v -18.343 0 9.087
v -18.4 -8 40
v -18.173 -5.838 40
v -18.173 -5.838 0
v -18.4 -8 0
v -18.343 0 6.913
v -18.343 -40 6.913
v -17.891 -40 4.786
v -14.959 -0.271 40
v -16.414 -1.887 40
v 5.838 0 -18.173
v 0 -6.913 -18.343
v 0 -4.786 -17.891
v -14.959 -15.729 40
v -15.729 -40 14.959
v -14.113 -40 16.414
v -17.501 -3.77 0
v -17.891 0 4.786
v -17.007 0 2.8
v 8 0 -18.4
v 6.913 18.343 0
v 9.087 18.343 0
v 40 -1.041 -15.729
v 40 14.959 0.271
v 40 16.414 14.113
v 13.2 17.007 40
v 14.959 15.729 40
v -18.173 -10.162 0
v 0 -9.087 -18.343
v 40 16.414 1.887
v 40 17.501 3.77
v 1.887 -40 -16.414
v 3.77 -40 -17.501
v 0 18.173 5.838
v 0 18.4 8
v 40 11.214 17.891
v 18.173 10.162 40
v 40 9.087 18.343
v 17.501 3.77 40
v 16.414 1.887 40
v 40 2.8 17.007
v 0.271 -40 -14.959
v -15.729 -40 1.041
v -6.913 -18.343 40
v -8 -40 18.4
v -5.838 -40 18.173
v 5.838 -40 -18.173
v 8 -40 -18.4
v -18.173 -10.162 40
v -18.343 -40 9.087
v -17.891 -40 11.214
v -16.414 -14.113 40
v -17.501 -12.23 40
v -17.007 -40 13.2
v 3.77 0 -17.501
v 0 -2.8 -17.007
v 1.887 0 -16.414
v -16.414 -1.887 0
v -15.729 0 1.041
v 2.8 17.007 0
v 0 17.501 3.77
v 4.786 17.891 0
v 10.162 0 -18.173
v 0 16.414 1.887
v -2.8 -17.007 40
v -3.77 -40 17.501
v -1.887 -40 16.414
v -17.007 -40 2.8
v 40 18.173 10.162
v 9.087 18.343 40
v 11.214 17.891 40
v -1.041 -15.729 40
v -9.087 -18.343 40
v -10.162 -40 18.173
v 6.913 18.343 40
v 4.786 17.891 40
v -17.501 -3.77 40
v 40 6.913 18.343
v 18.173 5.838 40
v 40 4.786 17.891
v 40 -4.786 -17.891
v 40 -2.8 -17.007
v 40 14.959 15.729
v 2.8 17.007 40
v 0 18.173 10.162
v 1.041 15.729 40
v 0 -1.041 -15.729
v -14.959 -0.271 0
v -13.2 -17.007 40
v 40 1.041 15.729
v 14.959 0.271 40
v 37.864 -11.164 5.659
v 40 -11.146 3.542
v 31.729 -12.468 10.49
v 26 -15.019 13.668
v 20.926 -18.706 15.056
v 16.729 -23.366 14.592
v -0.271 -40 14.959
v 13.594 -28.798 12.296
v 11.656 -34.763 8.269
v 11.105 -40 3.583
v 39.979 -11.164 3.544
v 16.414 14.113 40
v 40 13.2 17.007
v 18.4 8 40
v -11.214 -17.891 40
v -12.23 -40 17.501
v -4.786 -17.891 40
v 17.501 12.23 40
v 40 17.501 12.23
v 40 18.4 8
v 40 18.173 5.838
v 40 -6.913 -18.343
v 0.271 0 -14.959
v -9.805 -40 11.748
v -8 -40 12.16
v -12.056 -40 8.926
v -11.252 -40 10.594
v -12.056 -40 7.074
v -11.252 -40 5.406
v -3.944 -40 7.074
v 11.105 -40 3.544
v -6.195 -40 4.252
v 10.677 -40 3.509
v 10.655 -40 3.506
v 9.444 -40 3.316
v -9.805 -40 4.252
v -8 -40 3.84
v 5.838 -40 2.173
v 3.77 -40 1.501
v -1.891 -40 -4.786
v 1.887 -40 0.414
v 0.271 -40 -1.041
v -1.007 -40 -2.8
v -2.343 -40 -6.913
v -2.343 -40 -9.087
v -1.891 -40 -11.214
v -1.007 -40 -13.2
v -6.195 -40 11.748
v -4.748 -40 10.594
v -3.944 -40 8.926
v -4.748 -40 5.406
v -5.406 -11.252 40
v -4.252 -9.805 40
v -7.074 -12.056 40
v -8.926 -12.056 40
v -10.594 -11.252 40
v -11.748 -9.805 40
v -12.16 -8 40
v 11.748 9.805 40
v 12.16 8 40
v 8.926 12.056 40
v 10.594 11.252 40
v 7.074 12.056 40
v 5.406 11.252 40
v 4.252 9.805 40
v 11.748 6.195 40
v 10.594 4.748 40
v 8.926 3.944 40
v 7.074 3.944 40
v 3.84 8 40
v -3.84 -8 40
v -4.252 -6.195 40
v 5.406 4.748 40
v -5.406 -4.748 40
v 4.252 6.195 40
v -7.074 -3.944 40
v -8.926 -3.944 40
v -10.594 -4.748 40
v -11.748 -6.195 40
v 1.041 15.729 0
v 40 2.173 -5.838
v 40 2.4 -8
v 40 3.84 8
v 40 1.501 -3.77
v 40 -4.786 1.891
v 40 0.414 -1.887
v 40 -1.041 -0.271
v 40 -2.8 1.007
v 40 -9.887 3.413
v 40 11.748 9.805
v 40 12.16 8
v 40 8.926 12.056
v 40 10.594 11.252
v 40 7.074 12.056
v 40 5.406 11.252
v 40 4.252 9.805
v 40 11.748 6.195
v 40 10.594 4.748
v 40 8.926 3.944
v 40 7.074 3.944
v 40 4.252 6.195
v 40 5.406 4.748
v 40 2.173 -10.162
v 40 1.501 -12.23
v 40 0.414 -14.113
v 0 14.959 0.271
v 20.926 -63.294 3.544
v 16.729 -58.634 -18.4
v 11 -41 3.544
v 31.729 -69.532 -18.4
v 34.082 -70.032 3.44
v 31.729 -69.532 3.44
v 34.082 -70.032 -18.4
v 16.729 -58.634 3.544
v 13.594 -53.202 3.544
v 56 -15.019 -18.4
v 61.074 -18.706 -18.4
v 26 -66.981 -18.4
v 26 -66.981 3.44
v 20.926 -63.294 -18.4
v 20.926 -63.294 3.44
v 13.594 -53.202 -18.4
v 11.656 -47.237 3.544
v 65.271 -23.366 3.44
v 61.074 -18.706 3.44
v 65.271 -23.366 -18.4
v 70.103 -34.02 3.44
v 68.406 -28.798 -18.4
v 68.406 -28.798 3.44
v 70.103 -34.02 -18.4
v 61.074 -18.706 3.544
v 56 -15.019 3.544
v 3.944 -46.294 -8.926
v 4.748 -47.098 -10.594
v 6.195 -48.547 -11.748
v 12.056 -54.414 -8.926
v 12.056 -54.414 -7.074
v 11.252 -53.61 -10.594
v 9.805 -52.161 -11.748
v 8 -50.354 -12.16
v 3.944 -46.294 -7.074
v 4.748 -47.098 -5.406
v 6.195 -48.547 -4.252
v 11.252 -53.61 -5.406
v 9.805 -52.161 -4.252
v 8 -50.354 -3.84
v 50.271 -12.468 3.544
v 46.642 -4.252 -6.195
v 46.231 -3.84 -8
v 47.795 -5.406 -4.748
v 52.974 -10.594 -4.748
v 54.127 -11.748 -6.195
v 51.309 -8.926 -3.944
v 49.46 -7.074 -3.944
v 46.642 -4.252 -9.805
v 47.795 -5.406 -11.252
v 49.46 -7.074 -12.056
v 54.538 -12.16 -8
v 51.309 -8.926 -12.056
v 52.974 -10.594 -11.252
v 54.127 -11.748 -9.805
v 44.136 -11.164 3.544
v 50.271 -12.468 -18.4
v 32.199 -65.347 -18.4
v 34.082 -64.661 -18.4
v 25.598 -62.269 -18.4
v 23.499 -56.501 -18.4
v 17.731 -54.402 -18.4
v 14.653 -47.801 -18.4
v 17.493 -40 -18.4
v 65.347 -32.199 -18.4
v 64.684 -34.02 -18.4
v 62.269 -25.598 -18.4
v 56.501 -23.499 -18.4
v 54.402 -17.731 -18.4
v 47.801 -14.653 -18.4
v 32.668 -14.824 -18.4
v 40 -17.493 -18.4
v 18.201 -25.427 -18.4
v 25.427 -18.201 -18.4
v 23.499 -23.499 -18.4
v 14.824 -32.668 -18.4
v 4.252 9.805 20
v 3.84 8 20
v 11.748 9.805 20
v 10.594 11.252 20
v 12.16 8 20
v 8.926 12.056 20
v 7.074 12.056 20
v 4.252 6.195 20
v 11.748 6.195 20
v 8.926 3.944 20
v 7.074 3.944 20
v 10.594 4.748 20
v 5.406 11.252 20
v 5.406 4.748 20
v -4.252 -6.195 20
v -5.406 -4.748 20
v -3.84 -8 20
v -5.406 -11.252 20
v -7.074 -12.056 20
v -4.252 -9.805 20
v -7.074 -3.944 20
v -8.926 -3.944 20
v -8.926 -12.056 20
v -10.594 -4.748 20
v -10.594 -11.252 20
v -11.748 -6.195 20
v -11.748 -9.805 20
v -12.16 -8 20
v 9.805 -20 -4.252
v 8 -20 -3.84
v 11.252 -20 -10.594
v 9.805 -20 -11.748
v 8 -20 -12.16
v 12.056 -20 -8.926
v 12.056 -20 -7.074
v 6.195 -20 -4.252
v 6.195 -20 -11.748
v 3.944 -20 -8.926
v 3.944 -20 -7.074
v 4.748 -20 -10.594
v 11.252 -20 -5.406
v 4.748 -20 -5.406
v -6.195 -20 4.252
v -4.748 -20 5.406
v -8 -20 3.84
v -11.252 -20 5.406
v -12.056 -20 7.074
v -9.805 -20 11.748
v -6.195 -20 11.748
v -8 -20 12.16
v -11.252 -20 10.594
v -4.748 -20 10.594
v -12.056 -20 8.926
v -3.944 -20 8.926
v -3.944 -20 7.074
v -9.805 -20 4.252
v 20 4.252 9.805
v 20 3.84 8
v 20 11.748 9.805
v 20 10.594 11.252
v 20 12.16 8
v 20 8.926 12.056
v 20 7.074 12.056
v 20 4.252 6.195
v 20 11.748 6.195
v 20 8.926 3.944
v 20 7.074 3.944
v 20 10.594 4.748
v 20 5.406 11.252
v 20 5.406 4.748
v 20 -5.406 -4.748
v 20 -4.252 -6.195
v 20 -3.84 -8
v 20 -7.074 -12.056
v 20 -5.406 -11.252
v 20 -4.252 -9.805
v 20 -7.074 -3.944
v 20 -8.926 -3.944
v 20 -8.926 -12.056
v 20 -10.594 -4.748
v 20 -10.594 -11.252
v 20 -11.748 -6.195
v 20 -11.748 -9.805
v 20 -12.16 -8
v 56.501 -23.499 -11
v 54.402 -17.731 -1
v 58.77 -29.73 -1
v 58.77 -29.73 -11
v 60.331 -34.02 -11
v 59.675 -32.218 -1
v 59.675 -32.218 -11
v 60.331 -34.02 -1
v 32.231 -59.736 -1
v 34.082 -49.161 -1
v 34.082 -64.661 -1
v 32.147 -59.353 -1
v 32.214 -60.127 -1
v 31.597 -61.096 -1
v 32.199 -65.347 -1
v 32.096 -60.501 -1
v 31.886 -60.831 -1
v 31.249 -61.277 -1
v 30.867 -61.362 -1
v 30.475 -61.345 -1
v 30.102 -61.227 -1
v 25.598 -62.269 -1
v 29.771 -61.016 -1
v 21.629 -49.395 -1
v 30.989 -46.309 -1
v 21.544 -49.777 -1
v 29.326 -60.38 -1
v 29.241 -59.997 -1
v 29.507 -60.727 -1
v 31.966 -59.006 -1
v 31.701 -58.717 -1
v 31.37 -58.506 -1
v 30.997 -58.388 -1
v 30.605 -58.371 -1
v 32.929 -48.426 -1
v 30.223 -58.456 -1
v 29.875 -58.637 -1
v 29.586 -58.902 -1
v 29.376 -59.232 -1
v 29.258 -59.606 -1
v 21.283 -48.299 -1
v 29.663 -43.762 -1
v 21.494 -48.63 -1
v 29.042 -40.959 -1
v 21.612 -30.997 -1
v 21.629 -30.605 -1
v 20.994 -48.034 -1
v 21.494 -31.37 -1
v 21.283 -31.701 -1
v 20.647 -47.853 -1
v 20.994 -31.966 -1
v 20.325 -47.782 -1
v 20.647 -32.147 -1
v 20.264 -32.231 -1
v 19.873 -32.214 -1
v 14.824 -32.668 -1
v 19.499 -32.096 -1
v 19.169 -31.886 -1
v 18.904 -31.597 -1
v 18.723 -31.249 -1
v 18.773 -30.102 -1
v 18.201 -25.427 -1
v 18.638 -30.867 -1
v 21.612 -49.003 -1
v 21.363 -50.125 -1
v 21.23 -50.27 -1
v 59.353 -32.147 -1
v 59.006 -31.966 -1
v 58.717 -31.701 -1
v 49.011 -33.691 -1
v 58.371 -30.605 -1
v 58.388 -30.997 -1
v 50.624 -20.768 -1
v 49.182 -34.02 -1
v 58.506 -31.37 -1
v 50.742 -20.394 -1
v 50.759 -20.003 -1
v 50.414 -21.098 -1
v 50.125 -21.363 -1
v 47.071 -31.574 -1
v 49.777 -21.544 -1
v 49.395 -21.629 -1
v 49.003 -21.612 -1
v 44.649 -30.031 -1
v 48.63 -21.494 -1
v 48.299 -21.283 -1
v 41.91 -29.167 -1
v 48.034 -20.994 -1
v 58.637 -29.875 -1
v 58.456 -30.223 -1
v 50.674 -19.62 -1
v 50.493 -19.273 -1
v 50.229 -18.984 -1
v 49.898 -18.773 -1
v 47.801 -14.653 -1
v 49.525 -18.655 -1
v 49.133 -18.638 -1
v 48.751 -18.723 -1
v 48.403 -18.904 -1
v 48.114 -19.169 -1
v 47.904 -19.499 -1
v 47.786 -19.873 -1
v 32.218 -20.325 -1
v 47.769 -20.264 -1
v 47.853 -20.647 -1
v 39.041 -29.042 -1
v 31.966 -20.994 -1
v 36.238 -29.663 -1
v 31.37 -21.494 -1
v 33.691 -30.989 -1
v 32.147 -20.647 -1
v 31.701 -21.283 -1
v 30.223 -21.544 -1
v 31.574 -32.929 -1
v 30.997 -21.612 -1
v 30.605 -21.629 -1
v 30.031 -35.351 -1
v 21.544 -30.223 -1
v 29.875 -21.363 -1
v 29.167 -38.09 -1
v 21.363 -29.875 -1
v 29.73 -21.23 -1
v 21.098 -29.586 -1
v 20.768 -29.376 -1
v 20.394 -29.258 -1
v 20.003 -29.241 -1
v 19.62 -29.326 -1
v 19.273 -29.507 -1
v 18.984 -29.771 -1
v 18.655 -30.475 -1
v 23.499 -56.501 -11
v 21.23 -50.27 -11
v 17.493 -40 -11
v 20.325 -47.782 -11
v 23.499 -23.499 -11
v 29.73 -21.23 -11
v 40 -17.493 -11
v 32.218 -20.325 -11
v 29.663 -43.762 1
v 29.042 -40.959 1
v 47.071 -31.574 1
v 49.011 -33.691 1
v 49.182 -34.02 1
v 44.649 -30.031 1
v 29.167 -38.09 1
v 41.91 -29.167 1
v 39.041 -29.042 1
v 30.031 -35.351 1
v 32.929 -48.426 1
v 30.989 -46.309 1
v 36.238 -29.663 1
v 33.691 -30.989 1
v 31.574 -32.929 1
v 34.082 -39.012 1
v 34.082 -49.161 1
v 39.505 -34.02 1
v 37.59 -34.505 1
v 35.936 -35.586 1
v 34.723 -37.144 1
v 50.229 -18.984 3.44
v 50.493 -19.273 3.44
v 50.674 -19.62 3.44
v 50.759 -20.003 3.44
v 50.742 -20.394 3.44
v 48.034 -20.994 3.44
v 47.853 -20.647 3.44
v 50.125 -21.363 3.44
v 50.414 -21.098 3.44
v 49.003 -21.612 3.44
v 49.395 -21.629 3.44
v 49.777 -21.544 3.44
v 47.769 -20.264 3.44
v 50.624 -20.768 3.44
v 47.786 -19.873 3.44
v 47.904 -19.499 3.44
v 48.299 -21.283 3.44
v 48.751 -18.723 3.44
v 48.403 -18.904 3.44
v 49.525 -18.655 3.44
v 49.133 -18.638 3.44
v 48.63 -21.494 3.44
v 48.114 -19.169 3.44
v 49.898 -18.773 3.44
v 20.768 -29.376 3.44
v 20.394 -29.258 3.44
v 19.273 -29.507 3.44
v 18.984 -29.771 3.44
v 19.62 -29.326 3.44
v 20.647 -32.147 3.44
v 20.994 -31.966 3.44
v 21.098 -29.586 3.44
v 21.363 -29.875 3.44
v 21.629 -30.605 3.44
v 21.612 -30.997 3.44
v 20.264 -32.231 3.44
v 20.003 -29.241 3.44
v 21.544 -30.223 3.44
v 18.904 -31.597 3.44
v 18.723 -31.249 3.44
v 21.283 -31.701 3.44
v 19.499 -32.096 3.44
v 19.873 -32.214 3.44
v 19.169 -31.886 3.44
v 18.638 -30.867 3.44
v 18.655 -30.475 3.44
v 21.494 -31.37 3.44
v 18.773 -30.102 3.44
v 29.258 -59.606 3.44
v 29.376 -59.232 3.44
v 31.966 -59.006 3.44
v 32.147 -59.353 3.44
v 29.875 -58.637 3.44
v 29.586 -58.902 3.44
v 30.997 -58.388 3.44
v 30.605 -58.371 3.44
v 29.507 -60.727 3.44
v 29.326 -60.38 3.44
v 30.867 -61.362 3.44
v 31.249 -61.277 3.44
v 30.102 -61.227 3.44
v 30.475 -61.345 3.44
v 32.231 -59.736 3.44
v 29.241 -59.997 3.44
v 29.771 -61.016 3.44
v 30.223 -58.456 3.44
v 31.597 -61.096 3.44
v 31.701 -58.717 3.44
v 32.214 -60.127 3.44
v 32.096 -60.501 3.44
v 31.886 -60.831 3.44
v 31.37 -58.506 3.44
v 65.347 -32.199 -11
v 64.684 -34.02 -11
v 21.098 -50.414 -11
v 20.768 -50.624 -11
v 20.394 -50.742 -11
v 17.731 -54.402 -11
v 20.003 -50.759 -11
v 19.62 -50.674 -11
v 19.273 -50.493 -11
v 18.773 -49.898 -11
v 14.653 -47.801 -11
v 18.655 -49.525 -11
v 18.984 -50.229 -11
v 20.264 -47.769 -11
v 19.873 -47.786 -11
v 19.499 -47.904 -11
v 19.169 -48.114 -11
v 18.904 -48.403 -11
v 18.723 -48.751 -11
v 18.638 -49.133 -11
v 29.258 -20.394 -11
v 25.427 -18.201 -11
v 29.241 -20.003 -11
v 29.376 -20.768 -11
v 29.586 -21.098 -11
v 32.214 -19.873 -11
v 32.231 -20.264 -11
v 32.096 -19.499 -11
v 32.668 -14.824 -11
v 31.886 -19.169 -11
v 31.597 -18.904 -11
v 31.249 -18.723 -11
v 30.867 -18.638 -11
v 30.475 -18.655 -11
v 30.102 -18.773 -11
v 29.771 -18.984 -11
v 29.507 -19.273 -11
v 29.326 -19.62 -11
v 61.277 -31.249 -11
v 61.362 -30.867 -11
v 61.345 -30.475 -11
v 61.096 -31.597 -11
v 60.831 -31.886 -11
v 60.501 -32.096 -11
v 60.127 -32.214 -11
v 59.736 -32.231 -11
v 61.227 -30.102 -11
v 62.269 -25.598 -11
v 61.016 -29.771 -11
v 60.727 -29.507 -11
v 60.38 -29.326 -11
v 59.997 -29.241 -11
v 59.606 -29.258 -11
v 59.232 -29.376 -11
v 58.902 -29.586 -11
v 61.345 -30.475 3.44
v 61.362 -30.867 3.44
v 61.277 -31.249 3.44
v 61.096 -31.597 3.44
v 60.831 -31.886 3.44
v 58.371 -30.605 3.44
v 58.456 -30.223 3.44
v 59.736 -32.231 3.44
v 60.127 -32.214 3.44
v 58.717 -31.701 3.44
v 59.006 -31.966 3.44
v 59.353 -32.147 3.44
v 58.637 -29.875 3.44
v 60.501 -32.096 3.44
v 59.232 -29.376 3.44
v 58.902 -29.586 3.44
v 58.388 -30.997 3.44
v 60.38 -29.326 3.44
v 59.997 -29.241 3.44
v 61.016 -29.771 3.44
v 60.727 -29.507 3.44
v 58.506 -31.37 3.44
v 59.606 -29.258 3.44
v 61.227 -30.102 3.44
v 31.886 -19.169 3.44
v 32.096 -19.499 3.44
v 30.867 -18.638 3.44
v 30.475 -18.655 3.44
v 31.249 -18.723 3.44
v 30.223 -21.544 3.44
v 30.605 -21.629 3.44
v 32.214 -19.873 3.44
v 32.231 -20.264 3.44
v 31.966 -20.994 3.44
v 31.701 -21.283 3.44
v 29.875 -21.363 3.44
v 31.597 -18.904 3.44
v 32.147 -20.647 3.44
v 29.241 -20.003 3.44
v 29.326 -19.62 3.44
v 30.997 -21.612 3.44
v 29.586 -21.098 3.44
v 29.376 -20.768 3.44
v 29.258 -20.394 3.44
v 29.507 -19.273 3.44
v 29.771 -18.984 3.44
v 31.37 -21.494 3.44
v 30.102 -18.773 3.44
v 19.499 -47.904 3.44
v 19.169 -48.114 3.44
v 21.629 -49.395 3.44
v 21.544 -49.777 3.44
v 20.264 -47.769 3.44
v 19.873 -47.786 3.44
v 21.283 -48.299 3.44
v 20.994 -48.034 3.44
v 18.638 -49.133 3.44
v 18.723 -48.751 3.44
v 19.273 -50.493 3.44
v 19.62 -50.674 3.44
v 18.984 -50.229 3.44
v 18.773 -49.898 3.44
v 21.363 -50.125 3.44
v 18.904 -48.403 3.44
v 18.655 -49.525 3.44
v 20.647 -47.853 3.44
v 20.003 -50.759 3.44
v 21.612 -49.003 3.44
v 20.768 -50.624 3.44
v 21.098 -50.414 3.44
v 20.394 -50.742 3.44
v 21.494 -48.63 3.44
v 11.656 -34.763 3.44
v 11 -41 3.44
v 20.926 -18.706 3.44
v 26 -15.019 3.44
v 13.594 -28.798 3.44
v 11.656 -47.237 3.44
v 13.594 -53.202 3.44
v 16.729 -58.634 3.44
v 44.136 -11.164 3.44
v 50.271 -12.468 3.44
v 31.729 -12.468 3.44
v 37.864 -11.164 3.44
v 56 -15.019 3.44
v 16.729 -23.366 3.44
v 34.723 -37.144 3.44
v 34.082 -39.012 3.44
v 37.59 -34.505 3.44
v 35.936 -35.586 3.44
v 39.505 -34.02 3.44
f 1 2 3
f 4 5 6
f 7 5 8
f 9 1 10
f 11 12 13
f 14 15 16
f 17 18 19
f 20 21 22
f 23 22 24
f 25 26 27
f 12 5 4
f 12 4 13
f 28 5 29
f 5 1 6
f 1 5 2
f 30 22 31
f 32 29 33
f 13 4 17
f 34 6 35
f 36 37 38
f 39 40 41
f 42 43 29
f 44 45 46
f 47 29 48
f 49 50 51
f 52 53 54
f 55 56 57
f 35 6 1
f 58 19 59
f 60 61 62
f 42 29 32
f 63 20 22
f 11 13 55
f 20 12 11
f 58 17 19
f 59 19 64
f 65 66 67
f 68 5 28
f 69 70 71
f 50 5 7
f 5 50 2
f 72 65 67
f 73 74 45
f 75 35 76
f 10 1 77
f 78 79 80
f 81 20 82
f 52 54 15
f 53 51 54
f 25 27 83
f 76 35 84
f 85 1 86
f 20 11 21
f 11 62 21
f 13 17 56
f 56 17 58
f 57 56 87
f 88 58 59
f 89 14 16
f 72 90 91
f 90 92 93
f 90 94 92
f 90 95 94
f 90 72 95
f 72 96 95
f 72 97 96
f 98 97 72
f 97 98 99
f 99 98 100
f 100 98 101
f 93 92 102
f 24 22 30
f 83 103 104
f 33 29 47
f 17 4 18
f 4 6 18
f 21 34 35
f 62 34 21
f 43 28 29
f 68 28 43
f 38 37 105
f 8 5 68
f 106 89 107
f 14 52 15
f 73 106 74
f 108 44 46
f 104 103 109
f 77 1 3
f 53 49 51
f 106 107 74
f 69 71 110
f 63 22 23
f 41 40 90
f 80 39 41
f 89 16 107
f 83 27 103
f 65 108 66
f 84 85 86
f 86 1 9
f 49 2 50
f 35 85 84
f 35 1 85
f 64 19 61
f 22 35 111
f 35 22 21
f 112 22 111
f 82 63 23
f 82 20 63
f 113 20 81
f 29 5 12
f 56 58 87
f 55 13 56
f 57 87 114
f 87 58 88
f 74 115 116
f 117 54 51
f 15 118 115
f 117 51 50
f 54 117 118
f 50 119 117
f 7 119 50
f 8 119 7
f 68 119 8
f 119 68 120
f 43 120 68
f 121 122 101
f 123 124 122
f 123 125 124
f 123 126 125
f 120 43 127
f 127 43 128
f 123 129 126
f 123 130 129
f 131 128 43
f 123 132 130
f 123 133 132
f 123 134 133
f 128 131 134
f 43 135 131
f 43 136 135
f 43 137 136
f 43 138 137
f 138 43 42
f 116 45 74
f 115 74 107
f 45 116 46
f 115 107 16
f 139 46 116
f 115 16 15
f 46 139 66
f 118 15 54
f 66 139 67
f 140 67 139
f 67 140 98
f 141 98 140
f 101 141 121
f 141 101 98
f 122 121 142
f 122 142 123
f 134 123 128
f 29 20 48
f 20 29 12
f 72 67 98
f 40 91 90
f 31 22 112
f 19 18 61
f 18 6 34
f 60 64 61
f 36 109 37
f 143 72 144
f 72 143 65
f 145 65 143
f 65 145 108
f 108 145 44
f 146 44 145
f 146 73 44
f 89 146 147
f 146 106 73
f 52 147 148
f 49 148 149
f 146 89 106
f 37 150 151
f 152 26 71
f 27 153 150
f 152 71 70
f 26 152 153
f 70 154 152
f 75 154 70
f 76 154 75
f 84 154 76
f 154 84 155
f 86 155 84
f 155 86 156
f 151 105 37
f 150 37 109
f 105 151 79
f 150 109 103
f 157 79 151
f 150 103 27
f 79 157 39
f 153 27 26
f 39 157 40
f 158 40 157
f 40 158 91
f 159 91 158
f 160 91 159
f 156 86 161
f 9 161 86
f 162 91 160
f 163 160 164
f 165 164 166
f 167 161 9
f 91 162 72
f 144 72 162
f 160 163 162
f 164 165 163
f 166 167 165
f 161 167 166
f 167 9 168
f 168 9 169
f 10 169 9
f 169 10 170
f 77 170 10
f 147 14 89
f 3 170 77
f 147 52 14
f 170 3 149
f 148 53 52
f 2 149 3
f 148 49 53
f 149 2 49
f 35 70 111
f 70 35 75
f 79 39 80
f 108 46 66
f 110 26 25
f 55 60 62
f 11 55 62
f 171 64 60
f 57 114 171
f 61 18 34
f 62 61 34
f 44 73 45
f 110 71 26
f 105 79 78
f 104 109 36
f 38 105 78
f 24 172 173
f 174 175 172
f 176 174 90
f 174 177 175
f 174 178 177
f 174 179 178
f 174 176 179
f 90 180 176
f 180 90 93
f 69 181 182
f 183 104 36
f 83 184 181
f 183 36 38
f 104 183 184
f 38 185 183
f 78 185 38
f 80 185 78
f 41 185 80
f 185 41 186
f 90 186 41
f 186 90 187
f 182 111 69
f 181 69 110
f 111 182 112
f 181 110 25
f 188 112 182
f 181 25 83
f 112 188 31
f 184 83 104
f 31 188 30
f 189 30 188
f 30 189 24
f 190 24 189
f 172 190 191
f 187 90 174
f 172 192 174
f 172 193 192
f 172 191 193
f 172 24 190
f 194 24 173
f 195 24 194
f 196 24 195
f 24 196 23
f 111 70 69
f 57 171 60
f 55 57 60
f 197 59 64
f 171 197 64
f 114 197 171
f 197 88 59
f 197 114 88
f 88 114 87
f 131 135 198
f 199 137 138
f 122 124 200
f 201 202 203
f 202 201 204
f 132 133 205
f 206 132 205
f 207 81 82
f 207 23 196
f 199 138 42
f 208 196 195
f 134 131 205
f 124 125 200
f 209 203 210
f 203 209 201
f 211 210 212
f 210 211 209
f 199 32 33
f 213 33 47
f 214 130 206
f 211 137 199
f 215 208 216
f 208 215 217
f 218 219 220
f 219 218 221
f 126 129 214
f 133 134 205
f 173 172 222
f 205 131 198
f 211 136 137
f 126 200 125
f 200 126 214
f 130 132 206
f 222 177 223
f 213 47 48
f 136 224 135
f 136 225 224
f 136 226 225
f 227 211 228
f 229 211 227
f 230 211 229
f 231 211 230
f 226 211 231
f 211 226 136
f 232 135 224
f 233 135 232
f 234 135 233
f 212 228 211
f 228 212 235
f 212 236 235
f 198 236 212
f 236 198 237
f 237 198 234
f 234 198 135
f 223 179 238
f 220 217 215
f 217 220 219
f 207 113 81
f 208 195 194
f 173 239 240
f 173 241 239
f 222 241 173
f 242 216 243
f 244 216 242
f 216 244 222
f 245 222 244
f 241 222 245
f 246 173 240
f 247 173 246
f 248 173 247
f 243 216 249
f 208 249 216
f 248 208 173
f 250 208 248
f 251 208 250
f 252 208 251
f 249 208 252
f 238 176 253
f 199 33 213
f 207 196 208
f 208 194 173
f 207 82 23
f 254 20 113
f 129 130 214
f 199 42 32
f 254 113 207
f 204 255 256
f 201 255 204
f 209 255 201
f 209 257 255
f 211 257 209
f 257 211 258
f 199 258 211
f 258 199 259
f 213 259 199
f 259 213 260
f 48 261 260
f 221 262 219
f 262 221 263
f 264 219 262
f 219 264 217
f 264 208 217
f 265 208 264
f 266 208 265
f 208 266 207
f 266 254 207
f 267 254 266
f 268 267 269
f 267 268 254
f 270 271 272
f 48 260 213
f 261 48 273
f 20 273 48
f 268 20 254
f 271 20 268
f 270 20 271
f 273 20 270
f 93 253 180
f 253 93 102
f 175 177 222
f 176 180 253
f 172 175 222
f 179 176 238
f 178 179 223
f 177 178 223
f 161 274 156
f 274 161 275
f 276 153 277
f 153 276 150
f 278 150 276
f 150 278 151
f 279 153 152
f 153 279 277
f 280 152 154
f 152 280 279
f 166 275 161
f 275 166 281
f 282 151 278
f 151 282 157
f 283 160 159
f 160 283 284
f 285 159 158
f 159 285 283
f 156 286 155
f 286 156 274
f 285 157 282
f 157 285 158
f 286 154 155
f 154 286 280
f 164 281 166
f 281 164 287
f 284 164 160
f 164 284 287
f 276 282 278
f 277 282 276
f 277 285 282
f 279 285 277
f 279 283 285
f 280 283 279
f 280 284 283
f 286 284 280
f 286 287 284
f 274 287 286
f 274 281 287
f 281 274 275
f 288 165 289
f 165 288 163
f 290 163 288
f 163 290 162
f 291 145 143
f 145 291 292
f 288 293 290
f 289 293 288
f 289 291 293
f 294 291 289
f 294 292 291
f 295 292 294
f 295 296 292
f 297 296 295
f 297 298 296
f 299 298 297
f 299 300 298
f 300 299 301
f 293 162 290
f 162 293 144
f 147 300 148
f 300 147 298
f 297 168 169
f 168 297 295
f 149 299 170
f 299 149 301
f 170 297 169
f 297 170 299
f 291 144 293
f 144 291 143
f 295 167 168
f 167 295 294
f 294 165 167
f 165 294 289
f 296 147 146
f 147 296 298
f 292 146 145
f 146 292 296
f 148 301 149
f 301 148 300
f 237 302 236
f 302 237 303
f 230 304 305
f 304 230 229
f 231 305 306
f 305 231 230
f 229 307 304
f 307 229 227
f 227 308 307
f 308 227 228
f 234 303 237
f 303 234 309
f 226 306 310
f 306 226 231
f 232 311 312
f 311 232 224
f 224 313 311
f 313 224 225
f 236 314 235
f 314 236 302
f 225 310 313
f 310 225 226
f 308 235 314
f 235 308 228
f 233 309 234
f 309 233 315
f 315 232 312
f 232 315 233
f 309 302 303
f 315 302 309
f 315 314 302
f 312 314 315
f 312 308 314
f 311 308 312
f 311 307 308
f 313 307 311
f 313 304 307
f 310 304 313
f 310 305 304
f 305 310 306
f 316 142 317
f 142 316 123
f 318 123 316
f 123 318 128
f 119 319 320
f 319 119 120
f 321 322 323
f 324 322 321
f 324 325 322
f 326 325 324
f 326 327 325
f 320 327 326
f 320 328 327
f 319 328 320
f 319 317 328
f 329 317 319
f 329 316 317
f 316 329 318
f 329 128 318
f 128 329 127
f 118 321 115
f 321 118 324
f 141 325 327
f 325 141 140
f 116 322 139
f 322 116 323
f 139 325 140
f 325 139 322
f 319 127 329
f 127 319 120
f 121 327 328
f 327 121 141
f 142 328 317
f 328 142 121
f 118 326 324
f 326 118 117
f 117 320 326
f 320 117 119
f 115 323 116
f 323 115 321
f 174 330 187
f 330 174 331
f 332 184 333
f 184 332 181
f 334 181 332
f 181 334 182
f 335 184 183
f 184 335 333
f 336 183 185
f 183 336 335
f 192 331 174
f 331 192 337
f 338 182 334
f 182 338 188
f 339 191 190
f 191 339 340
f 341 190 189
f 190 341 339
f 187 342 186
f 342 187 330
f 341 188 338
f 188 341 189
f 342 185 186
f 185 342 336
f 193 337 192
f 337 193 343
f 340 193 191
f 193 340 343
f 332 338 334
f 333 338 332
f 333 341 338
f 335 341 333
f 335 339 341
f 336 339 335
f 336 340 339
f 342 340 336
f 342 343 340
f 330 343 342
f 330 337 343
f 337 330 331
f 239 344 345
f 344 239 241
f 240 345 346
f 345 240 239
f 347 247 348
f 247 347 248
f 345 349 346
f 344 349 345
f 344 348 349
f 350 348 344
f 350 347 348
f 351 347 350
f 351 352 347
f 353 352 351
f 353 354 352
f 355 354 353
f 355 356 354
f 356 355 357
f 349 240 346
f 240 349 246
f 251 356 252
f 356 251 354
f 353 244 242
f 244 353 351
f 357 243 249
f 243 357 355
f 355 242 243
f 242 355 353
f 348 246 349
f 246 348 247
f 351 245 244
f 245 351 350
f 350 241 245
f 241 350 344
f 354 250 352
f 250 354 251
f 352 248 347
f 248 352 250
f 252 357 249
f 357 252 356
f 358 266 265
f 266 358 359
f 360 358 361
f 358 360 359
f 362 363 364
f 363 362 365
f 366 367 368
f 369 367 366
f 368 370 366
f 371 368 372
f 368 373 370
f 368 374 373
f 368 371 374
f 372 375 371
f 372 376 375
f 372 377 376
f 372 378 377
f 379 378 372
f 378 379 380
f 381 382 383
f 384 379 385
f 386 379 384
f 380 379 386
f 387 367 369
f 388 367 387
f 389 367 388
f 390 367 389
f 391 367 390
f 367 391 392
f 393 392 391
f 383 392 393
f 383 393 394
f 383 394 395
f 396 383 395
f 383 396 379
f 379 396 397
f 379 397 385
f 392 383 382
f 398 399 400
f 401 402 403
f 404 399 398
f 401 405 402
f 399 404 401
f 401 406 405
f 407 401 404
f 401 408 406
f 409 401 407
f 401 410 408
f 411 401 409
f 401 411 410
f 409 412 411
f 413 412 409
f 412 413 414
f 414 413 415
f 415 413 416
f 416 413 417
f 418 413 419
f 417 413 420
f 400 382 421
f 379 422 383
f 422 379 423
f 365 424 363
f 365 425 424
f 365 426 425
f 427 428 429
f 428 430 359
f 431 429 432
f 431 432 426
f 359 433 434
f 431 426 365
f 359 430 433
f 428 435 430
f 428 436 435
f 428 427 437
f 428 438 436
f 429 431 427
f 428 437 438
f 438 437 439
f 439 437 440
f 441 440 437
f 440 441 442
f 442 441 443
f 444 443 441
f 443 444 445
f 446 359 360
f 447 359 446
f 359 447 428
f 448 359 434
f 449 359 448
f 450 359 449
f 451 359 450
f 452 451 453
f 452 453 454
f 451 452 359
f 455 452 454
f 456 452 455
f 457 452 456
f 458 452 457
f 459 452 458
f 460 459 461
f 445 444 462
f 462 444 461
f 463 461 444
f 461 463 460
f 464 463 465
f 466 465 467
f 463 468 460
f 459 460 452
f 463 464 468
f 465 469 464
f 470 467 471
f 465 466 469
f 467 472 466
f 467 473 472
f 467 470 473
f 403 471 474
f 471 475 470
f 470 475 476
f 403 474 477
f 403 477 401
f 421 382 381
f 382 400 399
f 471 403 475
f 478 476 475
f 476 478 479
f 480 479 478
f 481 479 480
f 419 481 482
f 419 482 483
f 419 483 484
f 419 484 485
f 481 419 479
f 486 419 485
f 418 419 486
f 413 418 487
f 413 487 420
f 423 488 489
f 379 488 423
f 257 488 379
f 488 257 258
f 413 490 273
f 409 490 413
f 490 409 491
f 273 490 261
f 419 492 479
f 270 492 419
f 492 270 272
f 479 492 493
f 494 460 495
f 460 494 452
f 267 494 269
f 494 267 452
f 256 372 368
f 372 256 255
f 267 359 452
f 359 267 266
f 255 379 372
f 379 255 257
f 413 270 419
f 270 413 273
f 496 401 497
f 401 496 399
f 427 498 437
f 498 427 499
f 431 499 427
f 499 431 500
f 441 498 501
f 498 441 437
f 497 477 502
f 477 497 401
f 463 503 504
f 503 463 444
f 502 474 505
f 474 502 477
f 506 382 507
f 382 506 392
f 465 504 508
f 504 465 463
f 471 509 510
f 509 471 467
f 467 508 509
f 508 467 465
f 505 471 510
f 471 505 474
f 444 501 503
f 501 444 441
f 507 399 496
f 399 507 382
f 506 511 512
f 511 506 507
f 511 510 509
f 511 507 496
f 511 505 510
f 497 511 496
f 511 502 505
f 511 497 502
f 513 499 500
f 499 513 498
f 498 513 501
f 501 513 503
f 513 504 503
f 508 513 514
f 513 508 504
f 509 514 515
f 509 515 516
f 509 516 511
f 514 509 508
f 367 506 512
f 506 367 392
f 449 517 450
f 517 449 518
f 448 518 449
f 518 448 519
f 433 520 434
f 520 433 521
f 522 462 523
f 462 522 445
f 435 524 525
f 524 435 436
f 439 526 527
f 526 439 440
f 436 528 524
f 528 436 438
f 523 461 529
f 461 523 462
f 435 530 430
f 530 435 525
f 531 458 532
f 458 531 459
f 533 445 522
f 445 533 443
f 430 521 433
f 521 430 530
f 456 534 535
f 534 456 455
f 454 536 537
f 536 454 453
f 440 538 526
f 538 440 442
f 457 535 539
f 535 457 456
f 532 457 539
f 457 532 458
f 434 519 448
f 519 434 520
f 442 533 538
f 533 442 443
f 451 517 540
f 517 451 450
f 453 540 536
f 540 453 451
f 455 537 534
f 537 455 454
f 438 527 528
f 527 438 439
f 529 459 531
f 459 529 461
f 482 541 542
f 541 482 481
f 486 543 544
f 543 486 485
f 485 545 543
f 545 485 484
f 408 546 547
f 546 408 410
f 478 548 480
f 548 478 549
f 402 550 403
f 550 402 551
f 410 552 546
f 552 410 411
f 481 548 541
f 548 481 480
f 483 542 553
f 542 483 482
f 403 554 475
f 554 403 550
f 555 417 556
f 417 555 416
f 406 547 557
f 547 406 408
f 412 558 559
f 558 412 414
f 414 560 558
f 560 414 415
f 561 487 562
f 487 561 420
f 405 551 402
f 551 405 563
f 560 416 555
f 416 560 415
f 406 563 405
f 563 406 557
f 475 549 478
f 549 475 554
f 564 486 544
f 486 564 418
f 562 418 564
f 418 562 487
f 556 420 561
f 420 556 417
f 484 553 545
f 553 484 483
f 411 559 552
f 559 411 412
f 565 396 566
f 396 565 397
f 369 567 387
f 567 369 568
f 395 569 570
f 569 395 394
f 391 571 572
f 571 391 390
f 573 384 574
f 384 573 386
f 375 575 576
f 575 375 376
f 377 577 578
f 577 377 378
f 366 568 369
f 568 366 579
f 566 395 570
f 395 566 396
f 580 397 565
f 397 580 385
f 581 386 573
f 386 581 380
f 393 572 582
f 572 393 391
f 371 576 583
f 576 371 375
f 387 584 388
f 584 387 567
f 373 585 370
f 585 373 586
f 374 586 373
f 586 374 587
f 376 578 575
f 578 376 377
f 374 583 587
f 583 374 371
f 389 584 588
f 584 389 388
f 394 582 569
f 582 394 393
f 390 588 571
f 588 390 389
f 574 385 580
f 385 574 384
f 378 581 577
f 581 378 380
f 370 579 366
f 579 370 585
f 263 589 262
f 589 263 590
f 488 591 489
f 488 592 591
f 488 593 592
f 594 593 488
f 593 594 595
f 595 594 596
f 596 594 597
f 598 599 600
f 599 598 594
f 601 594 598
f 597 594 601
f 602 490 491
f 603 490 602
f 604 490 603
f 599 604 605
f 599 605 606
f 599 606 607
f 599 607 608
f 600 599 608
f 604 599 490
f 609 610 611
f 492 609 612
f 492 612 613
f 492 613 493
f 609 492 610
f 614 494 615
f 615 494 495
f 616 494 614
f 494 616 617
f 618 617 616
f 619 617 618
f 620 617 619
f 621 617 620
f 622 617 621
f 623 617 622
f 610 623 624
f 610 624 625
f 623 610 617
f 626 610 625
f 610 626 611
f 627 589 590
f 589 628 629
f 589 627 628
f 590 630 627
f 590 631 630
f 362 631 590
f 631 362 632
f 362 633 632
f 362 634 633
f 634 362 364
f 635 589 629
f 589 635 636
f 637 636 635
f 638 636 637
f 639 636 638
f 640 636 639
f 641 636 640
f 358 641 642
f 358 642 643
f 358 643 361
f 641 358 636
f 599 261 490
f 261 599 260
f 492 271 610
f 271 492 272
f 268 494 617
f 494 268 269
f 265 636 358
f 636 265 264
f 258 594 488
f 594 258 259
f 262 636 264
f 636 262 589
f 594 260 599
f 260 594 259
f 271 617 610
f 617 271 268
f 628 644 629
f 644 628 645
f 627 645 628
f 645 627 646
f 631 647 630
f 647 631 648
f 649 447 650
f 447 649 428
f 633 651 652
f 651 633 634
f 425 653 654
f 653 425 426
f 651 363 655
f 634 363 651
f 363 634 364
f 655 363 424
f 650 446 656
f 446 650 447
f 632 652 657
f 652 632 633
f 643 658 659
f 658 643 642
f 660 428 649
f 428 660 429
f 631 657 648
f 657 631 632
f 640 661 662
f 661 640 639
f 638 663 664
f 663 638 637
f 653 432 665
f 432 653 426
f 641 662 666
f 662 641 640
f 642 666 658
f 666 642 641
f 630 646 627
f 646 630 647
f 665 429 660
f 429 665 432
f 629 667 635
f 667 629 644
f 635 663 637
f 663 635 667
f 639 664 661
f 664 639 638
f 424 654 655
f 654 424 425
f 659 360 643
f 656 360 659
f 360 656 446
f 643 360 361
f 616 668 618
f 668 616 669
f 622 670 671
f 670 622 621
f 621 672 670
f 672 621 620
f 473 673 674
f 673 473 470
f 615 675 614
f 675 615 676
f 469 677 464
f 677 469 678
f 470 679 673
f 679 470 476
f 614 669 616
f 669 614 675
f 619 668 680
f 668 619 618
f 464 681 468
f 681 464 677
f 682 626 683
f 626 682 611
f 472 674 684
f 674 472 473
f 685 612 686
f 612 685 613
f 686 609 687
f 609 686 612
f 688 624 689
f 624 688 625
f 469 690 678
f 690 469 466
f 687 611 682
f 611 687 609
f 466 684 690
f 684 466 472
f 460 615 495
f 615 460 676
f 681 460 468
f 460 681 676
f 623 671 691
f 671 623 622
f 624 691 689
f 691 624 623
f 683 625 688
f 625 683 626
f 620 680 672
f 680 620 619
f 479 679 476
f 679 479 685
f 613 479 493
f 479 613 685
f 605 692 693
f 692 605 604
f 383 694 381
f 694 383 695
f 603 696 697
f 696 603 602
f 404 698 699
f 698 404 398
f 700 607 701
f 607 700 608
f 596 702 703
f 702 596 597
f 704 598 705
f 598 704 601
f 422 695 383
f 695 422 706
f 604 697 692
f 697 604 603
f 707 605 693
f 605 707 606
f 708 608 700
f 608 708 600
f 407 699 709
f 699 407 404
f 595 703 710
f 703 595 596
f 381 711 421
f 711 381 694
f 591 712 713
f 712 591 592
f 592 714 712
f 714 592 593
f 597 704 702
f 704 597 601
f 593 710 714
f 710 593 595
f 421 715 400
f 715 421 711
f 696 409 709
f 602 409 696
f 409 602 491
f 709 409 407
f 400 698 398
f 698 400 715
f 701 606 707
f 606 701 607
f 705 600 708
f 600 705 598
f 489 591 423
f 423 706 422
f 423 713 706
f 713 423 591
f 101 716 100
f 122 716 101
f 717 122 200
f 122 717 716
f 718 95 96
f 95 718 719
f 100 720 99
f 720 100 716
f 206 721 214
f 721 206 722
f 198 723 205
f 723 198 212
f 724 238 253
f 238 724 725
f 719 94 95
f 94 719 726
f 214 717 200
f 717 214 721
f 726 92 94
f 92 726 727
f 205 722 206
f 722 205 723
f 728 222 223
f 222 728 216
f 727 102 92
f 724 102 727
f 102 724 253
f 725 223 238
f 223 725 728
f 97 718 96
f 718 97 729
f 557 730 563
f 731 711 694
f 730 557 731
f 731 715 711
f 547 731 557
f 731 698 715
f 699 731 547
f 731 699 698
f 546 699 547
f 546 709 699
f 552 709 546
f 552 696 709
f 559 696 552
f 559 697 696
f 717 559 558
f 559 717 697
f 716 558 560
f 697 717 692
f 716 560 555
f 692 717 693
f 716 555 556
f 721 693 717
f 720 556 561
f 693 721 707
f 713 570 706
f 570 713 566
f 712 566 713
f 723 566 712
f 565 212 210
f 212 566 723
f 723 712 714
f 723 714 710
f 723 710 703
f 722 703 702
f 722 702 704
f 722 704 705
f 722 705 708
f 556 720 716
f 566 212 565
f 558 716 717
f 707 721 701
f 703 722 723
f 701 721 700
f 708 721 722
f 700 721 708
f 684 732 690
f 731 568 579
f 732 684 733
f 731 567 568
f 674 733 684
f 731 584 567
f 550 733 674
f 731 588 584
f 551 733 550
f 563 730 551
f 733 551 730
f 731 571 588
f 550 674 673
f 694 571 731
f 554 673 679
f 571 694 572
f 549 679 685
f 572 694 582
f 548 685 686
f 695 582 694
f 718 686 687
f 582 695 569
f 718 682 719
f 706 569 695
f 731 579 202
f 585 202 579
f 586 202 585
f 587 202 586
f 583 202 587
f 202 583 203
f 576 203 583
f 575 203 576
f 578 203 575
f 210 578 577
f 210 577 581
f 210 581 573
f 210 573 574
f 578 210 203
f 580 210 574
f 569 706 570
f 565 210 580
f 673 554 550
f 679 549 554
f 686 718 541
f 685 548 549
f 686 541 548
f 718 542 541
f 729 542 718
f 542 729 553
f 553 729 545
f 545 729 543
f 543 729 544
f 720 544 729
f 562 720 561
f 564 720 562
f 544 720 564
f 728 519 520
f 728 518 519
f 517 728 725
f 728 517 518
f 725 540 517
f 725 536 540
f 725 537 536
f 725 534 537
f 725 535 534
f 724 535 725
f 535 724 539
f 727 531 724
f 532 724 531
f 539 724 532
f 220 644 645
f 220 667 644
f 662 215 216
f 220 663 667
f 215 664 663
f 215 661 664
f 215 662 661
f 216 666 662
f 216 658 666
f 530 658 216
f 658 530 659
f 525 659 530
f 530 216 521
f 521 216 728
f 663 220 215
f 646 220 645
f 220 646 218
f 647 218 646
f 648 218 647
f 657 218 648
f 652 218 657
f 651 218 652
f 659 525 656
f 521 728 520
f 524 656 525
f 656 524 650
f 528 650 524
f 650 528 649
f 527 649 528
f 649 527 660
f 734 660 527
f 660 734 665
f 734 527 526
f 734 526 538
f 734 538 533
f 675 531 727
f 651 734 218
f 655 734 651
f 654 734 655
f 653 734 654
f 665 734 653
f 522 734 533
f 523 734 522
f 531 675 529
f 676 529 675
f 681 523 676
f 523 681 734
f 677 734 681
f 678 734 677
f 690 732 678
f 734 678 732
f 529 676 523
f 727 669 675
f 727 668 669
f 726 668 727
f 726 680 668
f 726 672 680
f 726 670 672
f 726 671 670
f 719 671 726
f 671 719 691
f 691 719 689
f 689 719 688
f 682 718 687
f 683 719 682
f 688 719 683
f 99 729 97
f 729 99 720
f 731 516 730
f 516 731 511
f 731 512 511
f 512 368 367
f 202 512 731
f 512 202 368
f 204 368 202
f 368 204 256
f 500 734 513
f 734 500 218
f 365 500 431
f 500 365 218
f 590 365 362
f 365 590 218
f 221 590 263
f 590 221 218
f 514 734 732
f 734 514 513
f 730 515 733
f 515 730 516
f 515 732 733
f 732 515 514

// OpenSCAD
// file: nema17.scad
module nema17() {
  motor_height = 34.0;
	difference(){
	  union(){
			translate([0,0,motor_height/2]) {
				intersection(){
					cube([42.3,42.3,motor_height], center = true);
					rotate([0,0,45]) translate([0,0,-1])
            cube([74.3*sin(45), 73.3*sin(45) ,motor_height+2], center = true);
				}
			}
			translate([0, 0, motor_height-.1]) cylinder(h=2.1, r=11, $fn=24);
			translate([0, 0, motor_height+2]) cylinder(h=20, r=2.5, $fn=24);
		}
		for(i=[0:3]){
				rotate([0, 0, 90*i])translate([15.5, 15.5, motor_height-4.5]) cylinder(h=5, r=1.5, $fn=24);
			}
	}
}

module nema17_simple() {
  motor_height = 34.0;
  translate([0,0,motor_height/2]) {
    intersection(){
      cube([42.3,42.3,motor_height], center = true);
      rotate([0,0,45]) translate([0,0,-1])
        cube([74.3*sin(45), 73.3*sin(45) ,motor_height+2], center = true);
    }
  }
  translate([0, 0, motor_height-.1]) cylinder(h=2.1, r=11, $fn=24);
  translate([0, 0, motor_height+2]) cylinder(h=20, r=2.5, $fn=24);
}


module nema17_holes() {
    for(i=[0:3]){
      rotate([0, 0, 90*i]) translate([15.5, 15.5, 0]) cylinder(h=100, r=1.501, $fn=24);
    }
}

module nema17_screw() {
  translate([0,0,56])
  cylinder(h=250, r=3, $fn=24);
}
nema17_screw();
nema17();
// file: rods.scad
rodr = 4;
rodl = 300;

module edge(radius=rodr, length=rodl) {
  translate([-radius*2,-radius*2,-length/2]) cylinder(r=radius, h=length);
  translate([radius*2,radius*2,-length/2]) cylinder(r=radius, h=length);
}

module parallel(radius, length) {
  offset = 20;
  distance = length/2 + offset;
  translate([-distance,offset,0]) edge(radius, length);
  translate([distance,offset,0]) rotate([0,0,90]) edge(radius, length);
}

module four() {
  translate([0, rodl/2, 0]) parallel(rodr, rodl);
  translate([0, -rodl/2, 0]) rotate([0,0,180]) parallel(rodr, rodl);
}

module rods() {
  four();
  rotate([90,0,0]) four();
  rotate([0,90,0]) four();
}

module rod_corner() {
  translate([0,0,170]) edge(rodr, rodl);
  rotate([0, -90, 0]) translate([0,0,-170]) edge(rodr, rodl);
  rotate([-90, 0, 0]) translate([0,0,-170]) edge(rodr, rodl);
}

rods();
// main file
use <rods.scad>;
use <nema17.scad>;

module corner(rod_r=4, rod_center_offset=8, rod_origin_offset=20) {
  hole_r = rod_r * 1.04;
  wall_r = hole_r * 2.5;
  difference() {
    union() {
      hull() {
        for (axis=[[0,0,0], [90,90,0], [90,0,90]])
          rotate(axis)
            for (i=[1,-1])
              translate([i*rod_center_offset, i*rod_center_offset, 0])
              cylinder(r=wall_r, h=rod_origin_offset*2);
      }
      hull() {
        rotate([90,90,0]) translate([rod_center_offset, rod_center_offset, 0])
          cylinder(r=wall_r, h=rod_origin_offset*2);
        rotate([90,0,90]) translate([-rod_center_offset, -rod_center_offset, 0])
          cylinder(r=wall_r, h=rod_origin_offset*2);
        translate([41, -41, -(wall_r+rod_center_offset)]) cylinder(r=30, h=wall_r*2.11);
      }
    }
    translate([41, -41, -(wall_r+rod_center_offset)+wall_r*2.1]) cylinder(r=30, h=20);
    for (axis=[[0,0,0], [90,90,0], [90,0,90]])
      rotate(axis)
        for (i=[1,-1])
          translate([i*rod_center_offset, i*rod_center_offset, rod_origin_offset])
          cylinder(r=hole_r, h=rod_origin_offset+50);
    translate([40, -40, -35]) rotate([0, 0, 20]) {nema17(); nema17_holes();}
    translate([40, -40, -45]) rotate([0, 0, -20]) {nema17(); nema17_holes();}
    hull() {
      cut_z=-30;
      translate([40, -40, cut_z]) cylinder(r=6, h=50);
      translate([80, -40, cut_z]) cylinder(r=6, h=50);
      translate([40, -80, cut_z]) cylinder(r=6, h=50);
    }
  }
}

module four_corners() {
  translate([-170, 170, -170]) corner();
  rotate([0,0,90]) translate([-170, 170, -170]) corner();
  rotate([0,0,180]) translate([-170, 170, -170]) corner();
  rotate([0,0,270]) translate([-170, 170, -170]) corner();
}

module cube_corners() {
  four_corners();
  rotate([180,0,0]) four_corners();
}

module z_axis_motion(rod_r=4, rod_center_offset=8) {
  hole_r = rod_r * 1.04;
  wall_r = hole_r * 2.5;
  motor = 42;
  motor_frame = 50;
  hull() {
        for (i=[1,-1])
          translate([i*rod_center_offset, i*rod_center_offset, -motor_frame/2])
          cylinder(r=wall_r, h=motor_frame);
        translate([-(motor_frame+rod_center_offset), rod_center_offset, -motor_frame/2])
          cylinder(r=wall_r, h=motor_frame);
    }
}

corner();
